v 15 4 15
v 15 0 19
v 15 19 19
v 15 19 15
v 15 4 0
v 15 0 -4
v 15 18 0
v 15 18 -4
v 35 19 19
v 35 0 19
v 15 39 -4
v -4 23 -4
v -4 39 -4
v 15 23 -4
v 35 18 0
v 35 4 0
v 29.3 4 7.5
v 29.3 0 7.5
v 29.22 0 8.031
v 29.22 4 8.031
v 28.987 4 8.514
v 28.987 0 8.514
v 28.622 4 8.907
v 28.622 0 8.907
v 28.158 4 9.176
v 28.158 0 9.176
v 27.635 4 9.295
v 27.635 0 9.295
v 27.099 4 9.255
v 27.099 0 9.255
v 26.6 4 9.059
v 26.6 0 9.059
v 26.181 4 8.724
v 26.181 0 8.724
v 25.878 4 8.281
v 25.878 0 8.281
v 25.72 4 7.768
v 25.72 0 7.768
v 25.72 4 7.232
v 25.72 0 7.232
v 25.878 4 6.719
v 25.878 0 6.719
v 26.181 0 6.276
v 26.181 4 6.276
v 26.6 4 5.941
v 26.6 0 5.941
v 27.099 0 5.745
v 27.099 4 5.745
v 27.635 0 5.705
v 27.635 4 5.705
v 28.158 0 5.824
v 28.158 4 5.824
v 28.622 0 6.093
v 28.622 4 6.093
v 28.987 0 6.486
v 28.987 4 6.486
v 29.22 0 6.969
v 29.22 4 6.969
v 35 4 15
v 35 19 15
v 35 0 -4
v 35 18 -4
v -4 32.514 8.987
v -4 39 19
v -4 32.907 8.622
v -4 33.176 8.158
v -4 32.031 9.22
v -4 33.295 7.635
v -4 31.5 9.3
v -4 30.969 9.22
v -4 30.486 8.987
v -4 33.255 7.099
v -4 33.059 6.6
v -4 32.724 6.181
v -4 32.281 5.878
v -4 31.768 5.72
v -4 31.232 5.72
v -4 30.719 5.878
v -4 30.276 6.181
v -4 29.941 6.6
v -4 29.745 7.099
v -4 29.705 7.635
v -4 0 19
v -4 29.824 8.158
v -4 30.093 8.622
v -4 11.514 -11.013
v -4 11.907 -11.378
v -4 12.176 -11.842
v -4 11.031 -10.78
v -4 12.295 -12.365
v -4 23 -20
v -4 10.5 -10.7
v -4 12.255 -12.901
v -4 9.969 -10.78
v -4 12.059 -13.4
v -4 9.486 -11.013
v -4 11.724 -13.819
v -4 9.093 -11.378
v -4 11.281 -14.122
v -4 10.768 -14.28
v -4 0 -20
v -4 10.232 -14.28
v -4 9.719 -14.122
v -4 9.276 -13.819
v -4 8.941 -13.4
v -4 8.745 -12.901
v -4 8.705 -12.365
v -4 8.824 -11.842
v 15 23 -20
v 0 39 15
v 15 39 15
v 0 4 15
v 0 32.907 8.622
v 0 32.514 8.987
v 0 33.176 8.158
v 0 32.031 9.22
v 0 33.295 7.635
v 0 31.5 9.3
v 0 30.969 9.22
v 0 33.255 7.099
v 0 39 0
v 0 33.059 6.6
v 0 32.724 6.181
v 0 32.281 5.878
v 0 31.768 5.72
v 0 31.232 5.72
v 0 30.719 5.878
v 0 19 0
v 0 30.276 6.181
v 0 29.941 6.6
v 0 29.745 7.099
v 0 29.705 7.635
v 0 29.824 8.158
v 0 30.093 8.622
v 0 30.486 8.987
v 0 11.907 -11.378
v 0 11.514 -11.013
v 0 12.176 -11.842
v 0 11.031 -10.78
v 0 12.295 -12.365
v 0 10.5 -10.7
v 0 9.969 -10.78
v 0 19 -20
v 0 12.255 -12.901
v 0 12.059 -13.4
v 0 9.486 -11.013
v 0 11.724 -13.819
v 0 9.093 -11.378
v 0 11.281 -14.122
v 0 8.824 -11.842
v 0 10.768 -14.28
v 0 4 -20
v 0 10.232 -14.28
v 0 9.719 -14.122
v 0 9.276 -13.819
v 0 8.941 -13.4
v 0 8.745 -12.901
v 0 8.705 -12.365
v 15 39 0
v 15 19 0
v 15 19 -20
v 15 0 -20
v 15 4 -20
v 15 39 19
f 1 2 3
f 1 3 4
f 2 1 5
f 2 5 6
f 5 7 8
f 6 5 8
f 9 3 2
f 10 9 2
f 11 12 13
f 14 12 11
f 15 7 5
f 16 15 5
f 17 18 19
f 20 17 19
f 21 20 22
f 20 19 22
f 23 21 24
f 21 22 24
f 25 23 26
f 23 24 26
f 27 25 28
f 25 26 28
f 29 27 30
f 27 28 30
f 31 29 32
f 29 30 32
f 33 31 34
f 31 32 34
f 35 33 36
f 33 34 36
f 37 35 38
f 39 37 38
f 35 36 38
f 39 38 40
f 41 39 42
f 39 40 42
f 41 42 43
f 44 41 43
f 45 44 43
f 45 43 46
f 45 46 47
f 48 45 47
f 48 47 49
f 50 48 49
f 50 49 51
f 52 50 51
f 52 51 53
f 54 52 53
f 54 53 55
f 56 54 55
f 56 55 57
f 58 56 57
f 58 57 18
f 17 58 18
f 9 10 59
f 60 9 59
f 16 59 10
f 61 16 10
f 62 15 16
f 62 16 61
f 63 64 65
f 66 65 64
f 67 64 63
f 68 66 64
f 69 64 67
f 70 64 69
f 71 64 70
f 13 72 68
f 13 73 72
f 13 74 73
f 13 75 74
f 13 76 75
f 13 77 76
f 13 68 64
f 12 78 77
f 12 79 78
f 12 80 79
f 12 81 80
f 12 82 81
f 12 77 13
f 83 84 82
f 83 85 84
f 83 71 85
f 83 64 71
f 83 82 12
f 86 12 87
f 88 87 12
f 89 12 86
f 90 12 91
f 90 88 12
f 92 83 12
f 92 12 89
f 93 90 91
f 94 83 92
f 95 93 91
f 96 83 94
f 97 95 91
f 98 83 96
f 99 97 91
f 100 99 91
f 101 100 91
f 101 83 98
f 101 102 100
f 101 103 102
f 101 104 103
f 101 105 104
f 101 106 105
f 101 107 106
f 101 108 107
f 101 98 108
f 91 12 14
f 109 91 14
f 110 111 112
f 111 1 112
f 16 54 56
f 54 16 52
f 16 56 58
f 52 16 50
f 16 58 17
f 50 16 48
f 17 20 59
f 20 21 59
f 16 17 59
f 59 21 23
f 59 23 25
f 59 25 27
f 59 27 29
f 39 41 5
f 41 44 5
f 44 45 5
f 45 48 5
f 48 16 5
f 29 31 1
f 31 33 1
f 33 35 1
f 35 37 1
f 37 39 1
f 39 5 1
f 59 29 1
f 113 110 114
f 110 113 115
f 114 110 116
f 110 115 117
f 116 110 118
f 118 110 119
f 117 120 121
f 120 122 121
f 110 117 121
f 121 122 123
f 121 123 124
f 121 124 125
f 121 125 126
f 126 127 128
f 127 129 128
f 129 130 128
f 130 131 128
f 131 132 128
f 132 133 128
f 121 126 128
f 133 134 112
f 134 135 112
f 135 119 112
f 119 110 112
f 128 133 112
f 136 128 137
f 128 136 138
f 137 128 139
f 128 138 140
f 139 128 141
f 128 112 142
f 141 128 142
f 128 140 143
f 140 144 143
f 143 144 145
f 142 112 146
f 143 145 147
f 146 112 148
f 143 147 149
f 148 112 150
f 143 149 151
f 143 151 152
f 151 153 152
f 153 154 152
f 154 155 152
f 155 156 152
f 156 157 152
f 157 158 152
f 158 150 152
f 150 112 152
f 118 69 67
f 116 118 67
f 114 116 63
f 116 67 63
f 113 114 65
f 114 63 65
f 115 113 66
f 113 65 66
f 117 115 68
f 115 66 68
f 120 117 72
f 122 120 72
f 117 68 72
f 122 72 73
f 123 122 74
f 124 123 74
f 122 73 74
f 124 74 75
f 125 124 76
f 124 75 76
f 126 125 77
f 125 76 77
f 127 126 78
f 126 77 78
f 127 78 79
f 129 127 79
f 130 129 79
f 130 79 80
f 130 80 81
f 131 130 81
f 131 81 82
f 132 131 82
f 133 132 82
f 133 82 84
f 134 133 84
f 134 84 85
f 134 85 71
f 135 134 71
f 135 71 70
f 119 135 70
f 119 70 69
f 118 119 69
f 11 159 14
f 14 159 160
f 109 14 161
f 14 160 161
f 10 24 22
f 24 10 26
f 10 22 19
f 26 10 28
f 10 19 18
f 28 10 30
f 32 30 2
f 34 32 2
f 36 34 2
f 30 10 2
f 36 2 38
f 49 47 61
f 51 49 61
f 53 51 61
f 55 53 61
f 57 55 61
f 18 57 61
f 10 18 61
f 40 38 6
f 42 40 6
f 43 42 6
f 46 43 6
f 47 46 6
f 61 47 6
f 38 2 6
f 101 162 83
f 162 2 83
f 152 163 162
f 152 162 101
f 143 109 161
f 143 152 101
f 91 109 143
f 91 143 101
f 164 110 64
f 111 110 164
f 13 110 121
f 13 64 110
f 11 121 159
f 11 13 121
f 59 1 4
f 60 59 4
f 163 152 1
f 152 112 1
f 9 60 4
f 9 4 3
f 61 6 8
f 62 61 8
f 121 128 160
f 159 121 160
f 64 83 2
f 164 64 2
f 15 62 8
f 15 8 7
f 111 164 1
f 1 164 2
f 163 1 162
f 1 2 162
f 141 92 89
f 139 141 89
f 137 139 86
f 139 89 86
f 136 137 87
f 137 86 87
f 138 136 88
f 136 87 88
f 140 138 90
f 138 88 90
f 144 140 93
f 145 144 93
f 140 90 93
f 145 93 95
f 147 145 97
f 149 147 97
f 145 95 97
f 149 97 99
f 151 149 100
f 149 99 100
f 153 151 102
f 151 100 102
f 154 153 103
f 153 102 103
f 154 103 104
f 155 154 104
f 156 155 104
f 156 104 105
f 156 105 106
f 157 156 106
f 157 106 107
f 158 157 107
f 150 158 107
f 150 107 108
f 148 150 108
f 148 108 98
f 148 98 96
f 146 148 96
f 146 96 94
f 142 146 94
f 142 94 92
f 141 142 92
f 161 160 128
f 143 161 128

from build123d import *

# Parameters (mm, degrees)
SKETCH_1_W          = 4
SKETCH_1_H          = 19
SKETCH_1_W_2        = 15
SKETCH_1_H_2        = 4
EXTRUDE_1_DEPTH     = 15
SKETCH_2_W          = 19
SKETCH_2_H          = 19
EXTRUDE_2_DEPTH     = 4
EXTRUDE_3_DEPTH     = 20
EXTRUDE_5_DEPTH     = 20
EXTRUDE_6_DEPTH     = 20
SKETCH_7_W          = 19
SKETCH_7_H          = 4
EXTRUDE_7_DEPTH     = 16
SKETCH_8_R          = 1.8
CUT_EXTRUDE_1_DEPTH = 12
SKETCH_9_R          = 1.8
CUT_EXTRUDE_2_DEPTH = 12


with BuildPart() as part:
    # 草图1 → 凸台-拉伸1 (new body)
    with BuildSketch(Plane.XY):
        with Locations((-2, 9.5)):
            Rectangle(SKETCH_1_W, SKETCH_1_H)
        with Locations((7.5, 2)):
            Rectangle(SKETCH_1_W_2, SKETCH_1_H_2)
    extrude(amount=EXTRUDE_1_DEPTH)

    # 草图2 → 凸台-拉伸2 (add)
    with BuildSketch(Plane.XY.offset(15)):
        with Locations((5.5, 9.5)):
            Rectangle(SKETCH_2_W, SKETCH_2_H)
    extrude(amount=EXTRUDE_2_DEPTH)

    # 草图3 → 凸台-拉伸3 (add)
    with BuildSketch(Plane(origin=(0, 0, 0), x_dir=(-1, 0, 0), z_dir=(0, 0, -1))):
        Polygon((-15, 19), (0, 19), (0, 4), (-15, 4), (-15, 0), (4, 0), (4, 23), (-15, 23), align=None)
    extrude(amount=EXTRUDE_3_DEPTH)



with BuildPart() as body_2:
    # 草图5 → 凸台-拉伸5 (new body)
    with BuildSketch(Plane(origin=(15, 0, 0), x_dir=(0, 0, -1), z_dir=(1, 0, 0))):
        Polygon((-19, 0), (-15, 0), (0, 0), (4, 0), (4, 18), (0, 18), (0, 4), (-15, 4), (-15, 19), (-19, 19), align=None)
    extrude(amount=EXTRUDE_5_DEPTH)

    # 草图9 → 切除-拉伸2 (cut)
    with BuildSketch(Plane.XZ):
        with Locations((27.5, 7.5)):
            Circle(SKETCH_9_R)
    extrude(amount=-CUT_EXTRUDE_2_DEPTH, mode=Mode.SUBTRACT)


with BuildPart() as body_3:
    # 草图6 → 凸台-拉伸6 (new body)
    with BuildSketch(Plane(origin=(0, 19, 0), x_dir=(1, 0, 0), z_dir=(0, 1, 0))):
        Polygon((-4, -19), (15, -19), (15, -15), (0, -15), (0, 0), (-4, 0), (-4, -16), align=None)
    extrude(amount=EXTRUDE_6_DEPTH)


with BuildPart() as part_1:
    add(part.part)

    add(body_3.part)  # 凸台-拉伸7 merges body 3
    # 草图7 → 凸台-拉伸7 (add)
    with BuildSketch(Plane(origin=(0, 23, 0), x_dir=(1, 0, 0), z_dir=(0, 1, 0))):
        with Locations((5.5, 2)):
            Rectangle(SKETCH_7_W, SKETCH_7_H)
    extrude(amount=EXTRUDE_7_DEPTH)

    # 草图8 → 切除-拉伸1 (cut)
    with BuildSketch(Plane.ZY.offset(4)):
        with Locations((7.5, 31.5)):
            Circle(SKETCH_8_R)
        with Locations((-12.5, 10.5)):
            Circle(SKETCH_8_R)
    extrude(amount=-CUT_EXTRUDE_1_DEPTH, mode=Mode.SUBTRACT)


solid = Compound([body_2.part, part_1.part])
